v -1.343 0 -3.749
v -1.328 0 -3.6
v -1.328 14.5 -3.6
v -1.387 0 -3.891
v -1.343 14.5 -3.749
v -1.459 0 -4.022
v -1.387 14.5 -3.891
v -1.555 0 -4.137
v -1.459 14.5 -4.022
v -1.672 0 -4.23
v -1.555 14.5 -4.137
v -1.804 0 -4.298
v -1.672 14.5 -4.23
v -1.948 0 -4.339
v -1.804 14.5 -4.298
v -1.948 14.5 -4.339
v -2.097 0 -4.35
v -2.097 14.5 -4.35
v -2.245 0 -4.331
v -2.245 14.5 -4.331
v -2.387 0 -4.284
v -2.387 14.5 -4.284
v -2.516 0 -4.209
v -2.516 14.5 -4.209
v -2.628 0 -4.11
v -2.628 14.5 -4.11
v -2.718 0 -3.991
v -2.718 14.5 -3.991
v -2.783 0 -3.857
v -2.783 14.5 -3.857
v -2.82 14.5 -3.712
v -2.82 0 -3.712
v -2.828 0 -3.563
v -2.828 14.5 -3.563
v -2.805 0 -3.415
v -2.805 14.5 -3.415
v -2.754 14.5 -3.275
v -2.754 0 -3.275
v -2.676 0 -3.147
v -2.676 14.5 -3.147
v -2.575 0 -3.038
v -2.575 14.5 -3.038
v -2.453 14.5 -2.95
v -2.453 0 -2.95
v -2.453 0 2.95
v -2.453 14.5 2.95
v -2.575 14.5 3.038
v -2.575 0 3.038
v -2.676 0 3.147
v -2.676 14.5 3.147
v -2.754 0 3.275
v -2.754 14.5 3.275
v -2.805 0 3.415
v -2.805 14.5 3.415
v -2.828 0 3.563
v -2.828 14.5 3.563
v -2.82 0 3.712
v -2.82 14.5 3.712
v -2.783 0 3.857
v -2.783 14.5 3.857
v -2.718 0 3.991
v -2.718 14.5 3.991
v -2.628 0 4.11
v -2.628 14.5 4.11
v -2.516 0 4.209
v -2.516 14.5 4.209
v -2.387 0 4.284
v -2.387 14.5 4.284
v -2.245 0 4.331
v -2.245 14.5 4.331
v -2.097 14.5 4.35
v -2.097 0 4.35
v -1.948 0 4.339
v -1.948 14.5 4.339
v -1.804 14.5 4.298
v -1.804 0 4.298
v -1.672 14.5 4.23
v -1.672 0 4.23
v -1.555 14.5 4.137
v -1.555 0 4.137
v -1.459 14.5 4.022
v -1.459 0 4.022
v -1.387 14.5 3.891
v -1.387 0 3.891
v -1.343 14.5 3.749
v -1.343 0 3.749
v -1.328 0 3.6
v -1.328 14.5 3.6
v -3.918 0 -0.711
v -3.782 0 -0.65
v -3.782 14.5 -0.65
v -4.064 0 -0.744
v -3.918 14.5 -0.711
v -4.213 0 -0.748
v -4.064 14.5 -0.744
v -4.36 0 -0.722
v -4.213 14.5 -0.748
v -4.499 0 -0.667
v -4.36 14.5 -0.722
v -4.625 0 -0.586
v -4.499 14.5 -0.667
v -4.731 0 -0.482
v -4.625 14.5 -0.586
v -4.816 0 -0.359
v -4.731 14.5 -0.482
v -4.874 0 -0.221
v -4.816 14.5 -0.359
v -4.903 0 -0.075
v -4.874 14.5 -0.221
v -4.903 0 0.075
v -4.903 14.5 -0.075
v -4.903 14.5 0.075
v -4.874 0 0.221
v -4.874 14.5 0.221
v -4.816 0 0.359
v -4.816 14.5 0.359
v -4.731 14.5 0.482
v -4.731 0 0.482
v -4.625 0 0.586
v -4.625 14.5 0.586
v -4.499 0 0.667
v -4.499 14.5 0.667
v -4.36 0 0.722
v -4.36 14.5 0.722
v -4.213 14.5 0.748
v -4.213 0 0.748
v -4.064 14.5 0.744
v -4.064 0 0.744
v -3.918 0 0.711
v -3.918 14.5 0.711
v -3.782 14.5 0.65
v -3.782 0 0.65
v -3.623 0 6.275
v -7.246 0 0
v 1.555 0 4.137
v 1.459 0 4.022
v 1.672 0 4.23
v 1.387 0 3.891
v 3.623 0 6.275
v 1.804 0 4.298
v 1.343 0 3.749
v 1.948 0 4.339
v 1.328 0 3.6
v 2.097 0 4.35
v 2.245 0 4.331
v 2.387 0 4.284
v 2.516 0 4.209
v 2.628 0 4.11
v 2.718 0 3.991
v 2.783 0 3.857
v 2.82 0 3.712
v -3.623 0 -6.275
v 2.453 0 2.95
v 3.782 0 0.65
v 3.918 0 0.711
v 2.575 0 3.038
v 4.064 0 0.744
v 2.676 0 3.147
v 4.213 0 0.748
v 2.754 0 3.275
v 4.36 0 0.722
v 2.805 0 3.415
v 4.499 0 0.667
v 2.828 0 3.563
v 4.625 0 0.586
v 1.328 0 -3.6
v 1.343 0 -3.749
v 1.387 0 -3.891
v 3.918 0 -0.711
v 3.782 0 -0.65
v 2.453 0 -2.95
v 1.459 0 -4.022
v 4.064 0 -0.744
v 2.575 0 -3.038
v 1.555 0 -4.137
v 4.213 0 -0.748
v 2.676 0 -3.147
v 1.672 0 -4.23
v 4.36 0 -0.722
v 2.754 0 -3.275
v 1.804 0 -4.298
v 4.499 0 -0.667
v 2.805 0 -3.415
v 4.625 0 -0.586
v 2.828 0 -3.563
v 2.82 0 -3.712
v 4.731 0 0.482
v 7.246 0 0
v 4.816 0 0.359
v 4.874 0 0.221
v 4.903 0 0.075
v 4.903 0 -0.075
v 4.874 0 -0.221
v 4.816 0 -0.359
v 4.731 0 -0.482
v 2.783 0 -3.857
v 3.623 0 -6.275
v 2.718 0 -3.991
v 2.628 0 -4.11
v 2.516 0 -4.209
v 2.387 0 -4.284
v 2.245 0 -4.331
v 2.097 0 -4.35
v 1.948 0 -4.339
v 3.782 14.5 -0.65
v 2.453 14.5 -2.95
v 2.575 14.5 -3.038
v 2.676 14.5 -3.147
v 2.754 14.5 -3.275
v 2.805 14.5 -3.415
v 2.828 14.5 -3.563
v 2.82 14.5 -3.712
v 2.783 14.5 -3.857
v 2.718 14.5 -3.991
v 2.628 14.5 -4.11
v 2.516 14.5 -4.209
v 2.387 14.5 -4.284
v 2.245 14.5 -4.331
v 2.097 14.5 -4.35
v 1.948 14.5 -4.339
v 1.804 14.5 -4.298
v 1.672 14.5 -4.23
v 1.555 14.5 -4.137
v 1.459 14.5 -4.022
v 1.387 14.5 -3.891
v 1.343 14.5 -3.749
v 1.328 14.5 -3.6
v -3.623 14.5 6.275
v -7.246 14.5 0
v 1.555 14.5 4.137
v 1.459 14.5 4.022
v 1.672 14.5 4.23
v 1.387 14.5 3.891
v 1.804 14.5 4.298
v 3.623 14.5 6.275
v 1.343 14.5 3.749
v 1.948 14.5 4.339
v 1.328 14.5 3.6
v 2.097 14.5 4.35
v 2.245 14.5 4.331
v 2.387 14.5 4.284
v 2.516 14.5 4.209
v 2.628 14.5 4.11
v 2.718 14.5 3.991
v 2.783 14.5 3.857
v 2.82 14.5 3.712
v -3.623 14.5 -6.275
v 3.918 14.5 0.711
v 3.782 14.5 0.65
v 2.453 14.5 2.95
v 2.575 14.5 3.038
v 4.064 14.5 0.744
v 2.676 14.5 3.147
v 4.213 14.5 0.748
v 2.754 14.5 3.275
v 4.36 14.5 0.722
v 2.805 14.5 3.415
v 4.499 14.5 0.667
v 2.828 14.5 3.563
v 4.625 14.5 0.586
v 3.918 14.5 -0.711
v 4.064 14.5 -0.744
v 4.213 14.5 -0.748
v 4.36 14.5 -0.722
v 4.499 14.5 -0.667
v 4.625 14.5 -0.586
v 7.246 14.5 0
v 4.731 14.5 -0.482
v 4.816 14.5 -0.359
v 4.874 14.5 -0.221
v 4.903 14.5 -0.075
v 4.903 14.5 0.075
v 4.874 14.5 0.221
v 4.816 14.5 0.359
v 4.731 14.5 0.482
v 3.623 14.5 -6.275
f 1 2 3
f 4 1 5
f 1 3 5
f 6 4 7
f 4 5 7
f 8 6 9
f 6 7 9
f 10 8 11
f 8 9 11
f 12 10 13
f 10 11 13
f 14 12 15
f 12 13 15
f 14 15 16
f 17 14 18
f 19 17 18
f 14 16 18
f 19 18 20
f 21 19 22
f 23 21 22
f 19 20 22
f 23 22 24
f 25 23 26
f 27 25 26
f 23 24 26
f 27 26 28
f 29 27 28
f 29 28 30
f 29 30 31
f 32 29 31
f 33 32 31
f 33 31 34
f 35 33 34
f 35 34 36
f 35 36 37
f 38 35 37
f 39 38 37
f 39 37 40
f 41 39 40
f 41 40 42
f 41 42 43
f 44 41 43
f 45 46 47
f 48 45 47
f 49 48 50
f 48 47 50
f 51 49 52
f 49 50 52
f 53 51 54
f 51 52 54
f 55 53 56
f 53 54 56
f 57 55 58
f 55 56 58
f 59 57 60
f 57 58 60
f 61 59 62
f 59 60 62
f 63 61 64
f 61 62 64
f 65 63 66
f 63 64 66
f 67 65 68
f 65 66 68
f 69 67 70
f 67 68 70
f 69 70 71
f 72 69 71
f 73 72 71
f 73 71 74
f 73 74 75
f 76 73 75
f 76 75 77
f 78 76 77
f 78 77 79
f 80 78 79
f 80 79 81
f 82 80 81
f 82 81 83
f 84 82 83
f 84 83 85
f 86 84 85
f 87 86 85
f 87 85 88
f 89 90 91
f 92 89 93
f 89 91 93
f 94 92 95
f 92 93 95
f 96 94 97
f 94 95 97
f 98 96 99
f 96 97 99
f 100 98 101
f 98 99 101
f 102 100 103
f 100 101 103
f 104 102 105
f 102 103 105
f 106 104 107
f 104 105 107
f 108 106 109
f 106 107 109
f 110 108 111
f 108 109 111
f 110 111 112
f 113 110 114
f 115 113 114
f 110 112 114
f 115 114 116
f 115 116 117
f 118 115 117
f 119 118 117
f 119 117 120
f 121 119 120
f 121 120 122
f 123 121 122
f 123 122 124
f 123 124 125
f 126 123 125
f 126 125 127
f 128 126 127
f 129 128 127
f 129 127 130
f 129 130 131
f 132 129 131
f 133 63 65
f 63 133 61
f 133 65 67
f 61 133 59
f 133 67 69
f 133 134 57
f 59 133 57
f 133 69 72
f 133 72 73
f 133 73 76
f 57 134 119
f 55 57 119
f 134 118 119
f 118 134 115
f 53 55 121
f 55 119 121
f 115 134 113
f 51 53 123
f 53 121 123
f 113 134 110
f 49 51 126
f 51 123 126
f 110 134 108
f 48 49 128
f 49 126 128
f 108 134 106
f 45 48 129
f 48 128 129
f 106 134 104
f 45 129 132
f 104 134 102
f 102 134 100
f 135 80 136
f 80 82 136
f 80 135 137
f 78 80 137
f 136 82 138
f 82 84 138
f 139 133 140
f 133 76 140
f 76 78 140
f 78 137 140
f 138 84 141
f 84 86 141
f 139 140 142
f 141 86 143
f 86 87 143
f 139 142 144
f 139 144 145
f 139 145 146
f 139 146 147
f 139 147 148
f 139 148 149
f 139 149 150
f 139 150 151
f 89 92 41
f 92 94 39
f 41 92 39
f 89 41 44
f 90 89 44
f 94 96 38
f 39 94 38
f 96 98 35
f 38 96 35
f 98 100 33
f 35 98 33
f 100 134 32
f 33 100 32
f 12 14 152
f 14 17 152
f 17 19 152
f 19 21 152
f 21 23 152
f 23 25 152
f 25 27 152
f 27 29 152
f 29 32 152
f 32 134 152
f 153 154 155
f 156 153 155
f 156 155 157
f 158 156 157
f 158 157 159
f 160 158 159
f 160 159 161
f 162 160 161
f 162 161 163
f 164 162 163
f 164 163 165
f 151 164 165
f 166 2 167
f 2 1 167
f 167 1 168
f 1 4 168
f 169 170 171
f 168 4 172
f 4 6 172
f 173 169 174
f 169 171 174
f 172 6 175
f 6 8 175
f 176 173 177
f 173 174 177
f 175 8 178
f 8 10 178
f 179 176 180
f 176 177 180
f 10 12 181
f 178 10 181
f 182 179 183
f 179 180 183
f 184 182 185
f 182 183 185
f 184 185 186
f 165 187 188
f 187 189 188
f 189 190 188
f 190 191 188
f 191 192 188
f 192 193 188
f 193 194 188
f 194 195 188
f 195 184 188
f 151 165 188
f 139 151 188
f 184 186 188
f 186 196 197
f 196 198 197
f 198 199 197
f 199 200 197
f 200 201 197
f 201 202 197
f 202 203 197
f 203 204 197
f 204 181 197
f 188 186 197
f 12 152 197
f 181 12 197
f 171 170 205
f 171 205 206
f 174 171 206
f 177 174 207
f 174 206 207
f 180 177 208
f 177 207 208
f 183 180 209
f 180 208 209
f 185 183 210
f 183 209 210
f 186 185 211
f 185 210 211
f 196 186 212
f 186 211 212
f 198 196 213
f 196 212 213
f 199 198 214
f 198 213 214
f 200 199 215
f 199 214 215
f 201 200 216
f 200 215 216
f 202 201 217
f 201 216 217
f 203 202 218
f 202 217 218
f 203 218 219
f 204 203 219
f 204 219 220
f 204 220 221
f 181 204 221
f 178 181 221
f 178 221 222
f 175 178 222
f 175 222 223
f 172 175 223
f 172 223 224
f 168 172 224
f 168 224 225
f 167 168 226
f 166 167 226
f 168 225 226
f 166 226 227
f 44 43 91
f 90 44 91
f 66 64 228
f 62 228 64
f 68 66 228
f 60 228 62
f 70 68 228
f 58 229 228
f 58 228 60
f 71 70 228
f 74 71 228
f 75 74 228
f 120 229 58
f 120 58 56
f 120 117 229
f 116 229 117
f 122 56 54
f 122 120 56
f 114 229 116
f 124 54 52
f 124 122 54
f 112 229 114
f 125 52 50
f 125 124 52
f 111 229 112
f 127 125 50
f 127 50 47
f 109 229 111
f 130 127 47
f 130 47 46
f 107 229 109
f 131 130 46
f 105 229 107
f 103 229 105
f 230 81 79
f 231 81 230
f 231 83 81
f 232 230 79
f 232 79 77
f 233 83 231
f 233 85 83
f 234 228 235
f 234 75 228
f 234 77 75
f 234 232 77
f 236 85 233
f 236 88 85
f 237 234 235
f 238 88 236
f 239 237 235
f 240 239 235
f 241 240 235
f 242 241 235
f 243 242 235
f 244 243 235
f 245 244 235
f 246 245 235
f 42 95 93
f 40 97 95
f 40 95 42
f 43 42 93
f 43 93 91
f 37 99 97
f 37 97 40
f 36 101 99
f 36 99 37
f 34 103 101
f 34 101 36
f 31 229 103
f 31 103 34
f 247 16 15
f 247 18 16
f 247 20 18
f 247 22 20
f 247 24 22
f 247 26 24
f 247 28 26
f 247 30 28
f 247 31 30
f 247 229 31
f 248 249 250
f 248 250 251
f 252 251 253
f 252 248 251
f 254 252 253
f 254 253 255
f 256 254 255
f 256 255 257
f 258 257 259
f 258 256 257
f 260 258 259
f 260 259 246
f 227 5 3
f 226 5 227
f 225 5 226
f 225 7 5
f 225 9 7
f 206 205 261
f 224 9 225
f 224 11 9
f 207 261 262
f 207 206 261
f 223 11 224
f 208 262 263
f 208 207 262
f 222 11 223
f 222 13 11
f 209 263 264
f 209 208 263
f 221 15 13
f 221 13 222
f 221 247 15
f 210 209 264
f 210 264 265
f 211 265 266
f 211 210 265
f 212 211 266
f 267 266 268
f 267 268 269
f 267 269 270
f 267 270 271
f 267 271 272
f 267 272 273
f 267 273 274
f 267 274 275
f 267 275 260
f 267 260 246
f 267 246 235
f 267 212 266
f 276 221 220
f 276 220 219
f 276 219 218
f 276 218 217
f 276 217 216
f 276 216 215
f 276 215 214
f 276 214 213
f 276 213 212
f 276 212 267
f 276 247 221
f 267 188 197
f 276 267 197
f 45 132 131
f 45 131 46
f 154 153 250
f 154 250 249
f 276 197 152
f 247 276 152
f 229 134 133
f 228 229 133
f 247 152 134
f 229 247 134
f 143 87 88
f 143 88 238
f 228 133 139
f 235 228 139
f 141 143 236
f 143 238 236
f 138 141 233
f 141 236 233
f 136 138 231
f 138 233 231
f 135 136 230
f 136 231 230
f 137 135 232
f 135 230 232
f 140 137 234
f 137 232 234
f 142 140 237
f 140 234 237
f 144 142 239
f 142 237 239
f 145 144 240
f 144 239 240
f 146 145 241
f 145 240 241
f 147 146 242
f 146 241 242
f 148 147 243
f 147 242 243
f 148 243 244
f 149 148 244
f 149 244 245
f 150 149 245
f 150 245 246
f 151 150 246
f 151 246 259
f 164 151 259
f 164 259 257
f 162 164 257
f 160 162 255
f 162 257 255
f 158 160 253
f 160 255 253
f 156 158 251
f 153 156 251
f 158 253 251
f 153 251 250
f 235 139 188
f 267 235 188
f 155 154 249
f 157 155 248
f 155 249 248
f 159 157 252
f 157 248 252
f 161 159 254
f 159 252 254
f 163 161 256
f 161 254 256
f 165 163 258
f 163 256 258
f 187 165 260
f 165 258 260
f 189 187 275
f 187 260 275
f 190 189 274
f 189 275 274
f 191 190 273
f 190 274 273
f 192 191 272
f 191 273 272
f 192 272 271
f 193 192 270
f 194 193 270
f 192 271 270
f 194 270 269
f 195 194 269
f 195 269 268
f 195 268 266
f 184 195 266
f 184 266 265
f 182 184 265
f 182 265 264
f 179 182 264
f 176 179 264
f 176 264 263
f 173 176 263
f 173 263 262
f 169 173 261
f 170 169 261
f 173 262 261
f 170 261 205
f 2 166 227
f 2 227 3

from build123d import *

# Parameters (mm, degrees)
BOSS_EXTRUDE1_DEPTH = 14.5
SKETCH2_R           = 0.75
CUT_EXTRUDE1_DEPTH  = 18.381785246


with BuildPart() as part:
    # Sketch1 → Boss-Extrude1 (new body)
    with BuildSketch(Plane(origin=(0, 0, 0), x_dir=(1, 0, 0), z_dir=(0, 1, 0))):
        Polygon((-3.622872939, 6.275), (-7.245745878, 0), (-3.622872939, -6.275), (3.622872939, -6.275), (7.245745878, 0), (3.622872939, 6.275), align=None)
        Polygon((4.156921938, 0), (2.078460969, 3.6), (-2.078460969, 3.6), (-4.156921938, 0), (-2.078460969, -3.6), (2.078460969, -3.6), align=None, mode=Mode.SUBTRACT)
    extrude(amount=BOSS_EXTRUDE1_DEPTH)

    # Sketch2 → Cut-Extrude1 (cut, through all)
    with BuildSketch(Plane(origin=(0, 14.5, 0), x_dir=(1, 0, 0), z_dir=(0, 1, 0))):
        with Locations((-2.078460969, 3.6)):
            Circle(SKETCH2_R)
        with Locations((2.078460969, 3.6)):
            Circle(SKETCH2_R)
        with Locations((4.156921938, 0)):
            Circle(SKETCH2_R)
        with Locations((2.078460969, -3.6)):
            Circle(SKETCH2_R)
        with Locations((-2.078460969, -3.6)):
            Circle(SKETCH2_R)
        with Locations((-4.156921938, 0)):
            Circle(SKETCH2_R)
    extrude(amount=-CUT_EXTRUDE1_DEPTH, mode=Mode.SUBTRACT)


solid = part.part
